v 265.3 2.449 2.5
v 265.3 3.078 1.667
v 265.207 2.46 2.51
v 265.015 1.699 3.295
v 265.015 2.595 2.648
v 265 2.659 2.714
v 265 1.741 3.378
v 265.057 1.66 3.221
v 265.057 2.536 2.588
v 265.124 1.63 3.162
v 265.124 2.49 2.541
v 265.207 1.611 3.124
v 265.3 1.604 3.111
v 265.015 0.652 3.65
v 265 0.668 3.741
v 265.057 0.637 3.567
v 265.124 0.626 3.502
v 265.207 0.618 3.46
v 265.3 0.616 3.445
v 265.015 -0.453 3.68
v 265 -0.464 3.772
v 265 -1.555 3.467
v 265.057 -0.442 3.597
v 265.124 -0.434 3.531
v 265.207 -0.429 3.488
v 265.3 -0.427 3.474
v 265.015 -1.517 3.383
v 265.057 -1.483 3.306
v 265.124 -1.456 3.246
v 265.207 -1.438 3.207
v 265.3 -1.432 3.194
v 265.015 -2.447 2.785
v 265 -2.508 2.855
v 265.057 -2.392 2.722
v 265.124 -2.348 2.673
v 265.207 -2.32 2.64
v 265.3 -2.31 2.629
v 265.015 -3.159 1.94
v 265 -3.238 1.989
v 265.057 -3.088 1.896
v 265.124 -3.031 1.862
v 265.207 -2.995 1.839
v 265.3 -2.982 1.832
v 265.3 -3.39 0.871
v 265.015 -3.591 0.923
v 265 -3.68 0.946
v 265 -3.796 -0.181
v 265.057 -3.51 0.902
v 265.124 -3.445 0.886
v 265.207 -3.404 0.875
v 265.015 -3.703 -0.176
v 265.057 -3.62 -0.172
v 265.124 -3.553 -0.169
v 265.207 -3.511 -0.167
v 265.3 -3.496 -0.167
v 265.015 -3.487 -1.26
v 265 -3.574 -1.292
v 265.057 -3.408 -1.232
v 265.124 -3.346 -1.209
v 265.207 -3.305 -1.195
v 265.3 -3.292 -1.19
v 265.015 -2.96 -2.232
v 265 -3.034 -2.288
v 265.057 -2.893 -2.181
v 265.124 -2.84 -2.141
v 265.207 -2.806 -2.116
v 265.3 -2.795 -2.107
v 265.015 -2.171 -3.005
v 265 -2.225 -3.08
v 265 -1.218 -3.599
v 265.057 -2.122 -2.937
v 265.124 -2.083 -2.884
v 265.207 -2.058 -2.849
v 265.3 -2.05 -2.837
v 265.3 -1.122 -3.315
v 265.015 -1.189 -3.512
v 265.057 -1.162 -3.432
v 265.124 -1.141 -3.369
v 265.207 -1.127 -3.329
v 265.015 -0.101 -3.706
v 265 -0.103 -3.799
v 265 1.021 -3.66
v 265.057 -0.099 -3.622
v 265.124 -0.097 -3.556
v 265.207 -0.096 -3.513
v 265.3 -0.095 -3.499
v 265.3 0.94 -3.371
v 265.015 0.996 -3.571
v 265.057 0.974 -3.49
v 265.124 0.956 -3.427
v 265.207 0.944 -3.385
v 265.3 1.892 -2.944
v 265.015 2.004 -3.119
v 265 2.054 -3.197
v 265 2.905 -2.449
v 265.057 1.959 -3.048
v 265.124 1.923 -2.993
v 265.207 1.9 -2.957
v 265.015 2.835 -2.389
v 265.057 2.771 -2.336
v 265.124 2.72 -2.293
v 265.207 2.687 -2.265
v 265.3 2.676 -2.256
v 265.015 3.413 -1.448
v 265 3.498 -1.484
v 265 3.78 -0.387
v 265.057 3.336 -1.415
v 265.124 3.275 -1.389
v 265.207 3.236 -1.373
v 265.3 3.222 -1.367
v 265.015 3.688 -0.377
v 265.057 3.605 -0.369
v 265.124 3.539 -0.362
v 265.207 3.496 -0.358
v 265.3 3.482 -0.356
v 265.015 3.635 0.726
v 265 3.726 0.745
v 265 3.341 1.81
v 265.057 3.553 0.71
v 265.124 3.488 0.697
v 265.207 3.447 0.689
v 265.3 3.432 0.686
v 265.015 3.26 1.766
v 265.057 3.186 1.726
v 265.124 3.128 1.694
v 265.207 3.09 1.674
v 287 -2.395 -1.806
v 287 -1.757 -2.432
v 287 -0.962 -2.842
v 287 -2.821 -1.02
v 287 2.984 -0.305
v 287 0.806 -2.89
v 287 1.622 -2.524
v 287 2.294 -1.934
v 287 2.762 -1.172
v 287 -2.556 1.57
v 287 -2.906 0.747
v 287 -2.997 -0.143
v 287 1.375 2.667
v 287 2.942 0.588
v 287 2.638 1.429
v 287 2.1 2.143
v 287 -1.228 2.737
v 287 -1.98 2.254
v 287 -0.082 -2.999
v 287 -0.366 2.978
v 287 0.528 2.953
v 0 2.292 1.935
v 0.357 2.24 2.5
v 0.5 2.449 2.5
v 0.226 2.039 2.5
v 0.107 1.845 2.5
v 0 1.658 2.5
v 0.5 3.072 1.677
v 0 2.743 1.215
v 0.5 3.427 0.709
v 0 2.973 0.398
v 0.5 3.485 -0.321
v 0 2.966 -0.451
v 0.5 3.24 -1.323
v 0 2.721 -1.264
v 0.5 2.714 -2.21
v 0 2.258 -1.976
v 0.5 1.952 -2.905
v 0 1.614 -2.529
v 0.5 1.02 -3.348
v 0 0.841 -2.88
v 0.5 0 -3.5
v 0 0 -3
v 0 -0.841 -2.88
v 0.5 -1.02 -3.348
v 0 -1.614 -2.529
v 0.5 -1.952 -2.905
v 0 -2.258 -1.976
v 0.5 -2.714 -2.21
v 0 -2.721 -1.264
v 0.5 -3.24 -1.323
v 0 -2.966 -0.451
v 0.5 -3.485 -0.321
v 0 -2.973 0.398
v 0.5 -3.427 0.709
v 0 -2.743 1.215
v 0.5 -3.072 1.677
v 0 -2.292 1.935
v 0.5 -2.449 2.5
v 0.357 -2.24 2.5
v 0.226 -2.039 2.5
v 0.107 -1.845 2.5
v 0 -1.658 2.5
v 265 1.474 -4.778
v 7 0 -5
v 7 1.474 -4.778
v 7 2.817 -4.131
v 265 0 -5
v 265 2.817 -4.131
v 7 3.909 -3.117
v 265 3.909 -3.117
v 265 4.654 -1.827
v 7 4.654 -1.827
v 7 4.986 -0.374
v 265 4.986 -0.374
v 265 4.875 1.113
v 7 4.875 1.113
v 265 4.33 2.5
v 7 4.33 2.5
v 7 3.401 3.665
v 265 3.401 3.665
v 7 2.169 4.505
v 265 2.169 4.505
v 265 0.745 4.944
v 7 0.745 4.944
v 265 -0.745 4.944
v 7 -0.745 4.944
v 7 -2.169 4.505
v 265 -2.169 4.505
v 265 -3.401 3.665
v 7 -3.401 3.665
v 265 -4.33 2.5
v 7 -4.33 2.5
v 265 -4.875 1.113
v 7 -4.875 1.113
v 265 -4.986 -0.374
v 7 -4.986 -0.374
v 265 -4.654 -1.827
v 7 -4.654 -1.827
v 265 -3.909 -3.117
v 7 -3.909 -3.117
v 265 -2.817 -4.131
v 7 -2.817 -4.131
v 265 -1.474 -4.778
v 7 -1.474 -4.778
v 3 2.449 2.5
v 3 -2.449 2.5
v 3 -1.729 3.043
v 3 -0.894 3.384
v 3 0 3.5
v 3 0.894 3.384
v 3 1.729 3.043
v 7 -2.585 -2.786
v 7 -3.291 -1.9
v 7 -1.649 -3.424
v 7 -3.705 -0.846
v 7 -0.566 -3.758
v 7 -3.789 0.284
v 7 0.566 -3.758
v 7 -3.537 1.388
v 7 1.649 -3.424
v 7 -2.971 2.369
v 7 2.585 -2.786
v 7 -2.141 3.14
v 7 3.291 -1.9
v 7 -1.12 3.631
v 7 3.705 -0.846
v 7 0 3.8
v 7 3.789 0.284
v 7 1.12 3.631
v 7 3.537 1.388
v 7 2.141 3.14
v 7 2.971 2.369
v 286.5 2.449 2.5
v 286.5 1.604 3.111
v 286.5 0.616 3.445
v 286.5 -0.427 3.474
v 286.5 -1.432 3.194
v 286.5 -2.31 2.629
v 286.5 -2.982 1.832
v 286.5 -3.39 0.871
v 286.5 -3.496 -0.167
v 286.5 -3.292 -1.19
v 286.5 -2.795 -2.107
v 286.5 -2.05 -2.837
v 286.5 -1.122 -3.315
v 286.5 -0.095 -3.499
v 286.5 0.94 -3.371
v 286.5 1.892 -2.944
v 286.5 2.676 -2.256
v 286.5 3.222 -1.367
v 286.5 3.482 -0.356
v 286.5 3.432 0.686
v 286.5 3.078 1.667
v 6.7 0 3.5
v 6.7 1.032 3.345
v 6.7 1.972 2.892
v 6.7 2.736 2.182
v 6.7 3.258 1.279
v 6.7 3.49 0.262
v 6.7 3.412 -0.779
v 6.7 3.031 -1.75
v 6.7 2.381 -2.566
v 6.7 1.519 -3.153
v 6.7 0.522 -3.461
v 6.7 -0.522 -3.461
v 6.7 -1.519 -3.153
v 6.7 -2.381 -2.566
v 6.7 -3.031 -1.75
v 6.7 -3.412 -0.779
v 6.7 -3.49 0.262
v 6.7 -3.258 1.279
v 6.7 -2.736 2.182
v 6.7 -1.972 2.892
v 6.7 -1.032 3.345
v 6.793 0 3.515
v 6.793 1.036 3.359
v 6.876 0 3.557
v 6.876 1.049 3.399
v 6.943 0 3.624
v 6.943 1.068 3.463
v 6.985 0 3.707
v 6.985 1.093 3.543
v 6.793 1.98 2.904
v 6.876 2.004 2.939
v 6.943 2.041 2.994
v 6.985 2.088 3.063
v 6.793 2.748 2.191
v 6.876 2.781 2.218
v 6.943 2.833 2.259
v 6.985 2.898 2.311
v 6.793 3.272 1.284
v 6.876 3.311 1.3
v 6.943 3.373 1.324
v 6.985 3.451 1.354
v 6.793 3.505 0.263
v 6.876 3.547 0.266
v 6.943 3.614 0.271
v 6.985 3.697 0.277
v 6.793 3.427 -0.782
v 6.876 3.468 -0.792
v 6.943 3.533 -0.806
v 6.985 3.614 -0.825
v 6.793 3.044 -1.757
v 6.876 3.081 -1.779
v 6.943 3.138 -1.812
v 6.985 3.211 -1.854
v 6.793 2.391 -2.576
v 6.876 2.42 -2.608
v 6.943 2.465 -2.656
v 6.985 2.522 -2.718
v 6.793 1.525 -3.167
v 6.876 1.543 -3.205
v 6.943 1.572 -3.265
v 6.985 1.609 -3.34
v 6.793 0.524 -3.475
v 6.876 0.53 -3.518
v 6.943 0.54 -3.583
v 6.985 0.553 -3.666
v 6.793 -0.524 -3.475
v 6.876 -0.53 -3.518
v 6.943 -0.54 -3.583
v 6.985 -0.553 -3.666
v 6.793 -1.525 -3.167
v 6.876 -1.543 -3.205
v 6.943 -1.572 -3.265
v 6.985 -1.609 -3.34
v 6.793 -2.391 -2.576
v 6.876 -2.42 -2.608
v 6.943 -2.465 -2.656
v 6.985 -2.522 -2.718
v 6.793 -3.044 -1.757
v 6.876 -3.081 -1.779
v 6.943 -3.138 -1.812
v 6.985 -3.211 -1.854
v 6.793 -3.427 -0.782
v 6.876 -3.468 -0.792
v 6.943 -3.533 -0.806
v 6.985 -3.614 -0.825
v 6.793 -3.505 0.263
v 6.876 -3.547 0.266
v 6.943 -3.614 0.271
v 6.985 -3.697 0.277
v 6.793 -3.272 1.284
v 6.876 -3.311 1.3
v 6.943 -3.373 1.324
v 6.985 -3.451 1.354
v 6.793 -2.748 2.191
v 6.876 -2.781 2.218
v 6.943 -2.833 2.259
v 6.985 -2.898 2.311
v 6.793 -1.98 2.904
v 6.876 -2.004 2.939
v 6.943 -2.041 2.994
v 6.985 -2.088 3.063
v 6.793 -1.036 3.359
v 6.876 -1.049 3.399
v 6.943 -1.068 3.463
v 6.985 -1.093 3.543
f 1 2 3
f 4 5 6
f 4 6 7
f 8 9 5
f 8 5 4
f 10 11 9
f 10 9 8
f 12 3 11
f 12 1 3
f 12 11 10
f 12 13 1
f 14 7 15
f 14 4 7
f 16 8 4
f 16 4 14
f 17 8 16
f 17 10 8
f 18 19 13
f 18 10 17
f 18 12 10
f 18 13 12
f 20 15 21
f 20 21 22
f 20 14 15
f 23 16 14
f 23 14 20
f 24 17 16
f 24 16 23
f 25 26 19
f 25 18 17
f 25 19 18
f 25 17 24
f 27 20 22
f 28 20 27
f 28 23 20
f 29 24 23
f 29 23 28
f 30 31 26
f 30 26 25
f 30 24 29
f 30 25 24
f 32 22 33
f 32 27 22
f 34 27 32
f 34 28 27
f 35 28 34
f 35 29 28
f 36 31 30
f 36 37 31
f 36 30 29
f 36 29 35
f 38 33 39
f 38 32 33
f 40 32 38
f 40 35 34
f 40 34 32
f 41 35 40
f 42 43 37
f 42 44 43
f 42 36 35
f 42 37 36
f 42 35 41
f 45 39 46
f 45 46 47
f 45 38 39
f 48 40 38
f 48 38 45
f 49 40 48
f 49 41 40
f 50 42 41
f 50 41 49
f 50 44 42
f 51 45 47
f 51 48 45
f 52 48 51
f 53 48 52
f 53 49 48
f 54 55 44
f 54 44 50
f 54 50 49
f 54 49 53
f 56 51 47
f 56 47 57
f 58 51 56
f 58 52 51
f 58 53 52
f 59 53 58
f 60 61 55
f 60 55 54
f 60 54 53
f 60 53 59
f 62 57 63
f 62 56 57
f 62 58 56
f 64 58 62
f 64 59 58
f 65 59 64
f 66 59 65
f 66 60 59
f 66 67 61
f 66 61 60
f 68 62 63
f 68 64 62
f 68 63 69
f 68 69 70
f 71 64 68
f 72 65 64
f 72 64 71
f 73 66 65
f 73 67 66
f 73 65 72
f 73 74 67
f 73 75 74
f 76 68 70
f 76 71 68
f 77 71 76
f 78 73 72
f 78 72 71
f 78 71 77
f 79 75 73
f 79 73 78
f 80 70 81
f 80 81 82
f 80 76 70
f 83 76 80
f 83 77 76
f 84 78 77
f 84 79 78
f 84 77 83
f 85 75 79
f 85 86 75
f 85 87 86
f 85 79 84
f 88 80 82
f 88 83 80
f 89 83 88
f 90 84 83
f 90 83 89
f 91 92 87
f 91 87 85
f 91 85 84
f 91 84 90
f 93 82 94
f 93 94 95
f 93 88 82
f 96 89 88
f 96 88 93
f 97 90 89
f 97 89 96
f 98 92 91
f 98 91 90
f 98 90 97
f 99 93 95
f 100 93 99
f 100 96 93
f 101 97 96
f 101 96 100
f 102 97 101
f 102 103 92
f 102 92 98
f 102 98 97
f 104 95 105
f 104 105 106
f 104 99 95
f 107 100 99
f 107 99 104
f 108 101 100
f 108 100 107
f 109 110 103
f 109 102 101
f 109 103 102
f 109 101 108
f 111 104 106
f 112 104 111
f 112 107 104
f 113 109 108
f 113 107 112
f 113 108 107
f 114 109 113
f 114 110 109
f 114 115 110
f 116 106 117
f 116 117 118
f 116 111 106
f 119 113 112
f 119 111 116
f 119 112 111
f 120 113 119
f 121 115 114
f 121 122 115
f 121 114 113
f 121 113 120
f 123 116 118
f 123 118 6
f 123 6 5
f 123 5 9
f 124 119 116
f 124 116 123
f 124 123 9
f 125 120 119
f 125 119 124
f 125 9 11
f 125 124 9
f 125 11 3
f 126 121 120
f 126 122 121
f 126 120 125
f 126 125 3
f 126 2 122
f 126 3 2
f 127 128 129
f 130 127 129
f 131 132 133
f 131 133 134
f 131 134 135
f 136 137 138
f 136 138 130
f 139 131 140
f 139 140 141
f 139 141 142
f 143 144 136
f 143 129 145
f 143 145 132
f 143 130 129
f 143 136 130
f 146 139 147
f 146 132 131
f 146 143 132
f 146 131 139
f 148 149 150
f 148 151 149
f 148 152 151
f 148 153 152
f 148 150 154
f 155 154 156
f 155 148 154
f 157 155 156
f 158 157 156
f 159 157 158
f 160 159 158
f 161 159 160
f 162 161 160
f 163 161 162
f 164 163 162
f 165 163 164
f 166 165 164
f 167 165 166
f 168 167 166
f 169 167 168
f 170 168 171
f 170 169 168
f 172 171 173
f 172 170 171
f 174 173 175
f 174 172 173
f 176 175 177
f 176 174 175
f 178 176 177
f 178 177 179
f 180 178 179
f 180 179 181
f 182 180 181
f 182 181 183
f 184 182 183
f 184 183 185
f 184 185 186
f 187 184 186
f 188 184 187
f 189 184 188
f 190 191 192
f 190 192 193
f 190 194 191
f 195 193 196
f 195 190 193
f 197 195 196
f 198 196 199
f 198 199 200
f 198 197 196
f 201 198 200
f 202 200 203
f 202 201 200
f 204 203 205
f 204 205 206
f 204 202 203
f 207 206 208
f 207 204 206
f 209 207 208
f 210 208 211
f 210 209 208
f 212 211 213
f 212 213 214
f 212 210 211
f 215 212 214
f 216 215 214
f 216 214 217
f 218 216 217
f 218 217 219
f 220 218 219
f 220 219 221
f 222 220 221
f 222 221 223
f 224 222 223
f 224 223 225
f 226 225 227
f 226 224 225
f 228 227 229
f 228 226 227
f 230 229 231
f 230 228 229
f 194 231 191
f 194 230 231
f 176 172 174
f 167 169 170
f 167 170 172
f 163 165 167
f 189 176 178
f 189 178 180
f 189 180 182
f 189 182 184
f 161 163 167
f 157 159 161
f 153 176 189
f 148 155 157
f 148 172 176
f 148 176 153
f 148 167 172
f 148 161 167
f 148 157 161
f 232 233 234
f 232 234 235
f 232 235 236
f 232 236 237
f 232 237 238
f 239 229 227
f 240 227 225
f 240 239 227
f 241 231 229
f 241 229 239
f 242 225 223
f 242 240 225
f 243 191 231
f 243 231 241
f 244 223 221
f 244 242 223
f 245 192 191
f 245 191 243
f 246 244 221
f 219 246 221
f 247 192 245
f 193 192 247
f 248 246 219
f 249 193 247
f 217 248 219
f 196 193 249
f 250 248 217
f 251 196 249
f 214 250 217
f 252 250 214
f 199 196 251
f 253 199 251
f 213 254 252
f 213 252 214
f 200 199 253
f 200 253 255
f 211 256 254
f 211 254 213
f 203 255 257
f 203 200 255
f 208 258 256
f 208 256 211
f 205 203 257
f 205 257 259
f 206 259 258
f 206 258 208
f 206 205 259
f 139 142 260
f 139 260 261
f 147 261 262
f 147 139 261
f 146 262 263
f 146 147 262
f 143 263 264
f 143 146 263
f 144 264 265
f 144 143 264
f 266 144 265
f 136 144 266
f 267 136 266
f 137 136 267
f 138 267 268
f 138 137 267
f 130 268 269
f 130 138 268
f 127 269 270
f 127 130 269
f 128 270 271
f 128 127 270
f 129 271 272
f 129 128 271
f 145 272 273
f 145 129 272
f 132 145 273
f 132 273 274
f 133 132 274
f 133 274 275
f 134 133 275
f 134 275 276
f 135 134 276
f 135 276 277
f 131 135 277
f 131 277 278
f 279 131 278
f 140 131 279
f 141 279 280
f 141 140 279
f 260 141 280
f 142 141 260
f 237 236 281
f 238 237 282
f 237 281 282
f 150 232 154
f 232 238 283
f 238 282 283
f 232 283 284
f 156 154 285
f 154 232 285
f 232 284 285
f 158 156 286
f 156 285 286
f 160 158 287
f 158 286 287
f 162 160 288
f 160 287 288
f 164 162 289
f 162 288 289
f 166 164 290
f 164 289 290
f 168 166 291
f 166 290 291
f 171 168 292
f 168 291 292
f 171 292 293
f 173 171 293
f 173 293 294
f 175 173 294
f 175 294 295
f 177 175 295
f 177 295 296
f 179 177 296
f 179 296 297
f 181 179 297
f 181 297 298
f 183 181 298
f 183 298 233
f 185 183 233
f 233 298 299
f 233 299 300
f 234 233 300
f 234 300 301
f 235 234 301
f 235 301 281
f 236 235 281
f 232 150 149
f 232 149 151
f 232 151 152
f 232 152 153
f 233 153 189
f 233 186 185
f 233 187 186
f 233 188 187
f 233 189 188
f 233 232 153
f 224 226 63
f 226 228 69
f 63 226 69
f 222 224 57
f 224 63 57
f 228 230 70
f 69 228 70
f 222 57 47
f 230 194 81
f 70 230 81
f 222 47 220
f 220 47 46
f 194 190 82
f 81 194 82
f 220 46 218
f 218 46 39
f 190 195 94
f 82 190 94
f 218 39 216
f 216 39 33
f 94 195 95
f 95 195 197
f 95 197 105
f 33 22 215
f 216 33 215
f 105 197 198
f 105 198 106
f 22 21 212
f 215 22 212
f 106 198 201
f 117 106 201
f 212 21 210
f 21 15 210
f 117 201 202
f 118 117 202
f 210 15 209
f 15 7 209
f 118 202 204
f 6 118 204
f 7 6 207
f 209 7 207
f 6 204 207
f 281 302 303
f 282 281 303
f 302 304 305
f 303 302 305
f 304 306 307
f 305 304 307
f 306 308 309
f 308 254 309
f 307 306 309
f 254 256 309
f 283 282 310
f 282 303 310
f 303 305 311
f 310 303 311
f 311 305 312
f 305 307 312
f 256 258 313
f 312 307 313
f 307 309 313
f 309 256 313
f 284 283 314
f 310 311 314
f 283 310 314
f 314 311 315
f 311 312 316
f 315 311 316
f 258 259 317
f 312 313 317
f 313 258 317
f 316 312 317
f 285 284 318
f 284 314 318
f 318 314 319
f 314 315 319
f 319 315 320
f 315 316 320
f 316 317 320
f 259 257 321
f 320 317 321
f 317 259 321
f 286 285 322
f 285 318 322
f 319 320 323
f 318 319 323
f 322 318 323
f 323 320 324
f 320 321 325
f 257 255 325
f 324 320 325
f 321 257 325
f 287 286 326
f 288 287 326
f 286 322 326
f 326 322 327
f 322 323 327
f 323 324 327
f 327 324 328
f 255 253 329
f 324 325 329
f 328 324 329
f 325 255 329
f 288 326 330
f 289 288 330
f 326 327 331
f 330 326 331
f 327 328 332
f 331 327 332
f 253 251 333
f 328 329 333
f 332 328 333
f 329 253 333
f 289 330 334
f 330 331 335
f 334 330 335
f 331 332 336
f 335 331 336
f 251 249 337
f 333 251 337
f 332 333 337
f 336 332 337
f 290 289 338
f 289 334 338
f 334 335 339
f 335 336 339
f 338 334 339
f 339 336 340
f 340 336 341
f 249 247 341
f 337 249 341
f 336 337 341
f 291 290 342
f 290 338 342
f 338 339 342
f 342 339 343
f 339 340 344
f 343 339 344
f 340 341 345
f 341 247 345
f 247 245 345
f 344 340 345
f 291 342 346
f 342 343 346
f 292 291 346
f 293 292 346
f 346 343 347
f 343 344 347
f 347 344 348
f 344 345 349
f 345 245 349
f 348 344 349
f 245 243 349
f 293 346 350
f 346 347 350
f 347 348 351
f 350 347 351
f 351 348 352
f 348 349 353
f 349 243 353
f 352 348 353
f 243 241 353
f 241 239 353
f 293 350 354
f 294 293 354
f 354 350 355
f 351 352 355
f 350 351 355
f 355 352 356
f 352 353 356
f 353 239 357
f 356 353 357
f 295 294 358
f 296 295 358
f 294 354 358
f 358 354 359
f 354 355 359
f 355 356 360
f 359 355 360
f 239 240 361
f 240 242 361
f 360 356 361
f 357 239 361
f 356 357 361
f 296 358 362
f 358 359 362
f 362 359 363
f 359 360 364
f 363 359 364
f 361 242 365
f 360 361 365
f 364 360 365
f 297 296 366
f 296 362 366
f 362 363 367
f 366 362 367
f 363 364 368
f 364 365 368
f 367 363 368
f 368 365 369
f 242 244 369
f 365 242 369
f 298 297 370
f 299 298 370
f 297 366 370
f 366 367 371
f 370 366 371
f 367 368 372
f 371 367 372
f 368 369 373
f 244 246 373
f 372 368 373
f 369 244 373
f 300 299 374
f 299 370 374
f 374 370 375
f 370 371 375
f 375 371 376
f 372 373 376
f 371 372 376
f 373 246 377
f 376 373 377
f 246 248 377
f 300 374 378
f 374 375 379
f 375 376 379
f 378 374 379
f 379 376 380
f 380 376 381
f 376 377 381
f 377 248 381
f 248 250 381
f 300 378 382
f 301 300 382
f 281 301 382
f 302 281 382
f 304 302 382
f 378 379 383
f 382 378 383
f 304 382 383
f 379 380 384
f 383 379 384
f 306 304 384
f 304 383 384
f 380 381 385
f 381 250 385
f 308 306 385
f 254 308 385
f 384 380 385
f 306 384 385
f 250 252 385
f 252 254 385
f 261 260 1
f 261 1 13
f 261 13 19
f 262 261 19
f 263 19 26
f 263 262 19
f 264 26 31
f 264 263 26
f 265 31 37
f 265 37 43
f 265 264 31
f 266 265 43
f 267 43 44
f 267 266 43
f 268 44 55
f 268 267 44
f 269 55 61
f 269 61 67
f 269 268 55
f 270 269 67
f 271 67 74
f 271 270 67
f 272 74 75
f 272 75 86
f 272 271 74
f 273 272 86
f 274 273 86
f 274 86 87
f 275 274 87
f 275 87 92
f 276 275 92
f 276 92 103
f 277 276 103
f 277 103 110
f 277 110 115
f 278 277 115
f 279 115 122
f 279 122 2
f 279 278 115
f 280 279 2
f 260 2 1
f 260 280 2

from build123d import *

# Parameters (mm, degrees)
SKETCH1_W           = 258
SKETCH1_H           = 5
SKETCH2_R           = 3.5
BOSS_EXTRUDE1_DEPTH = 7
CUT_EXTRUDE1_START  = -3
CUT_EXTRUDE1_DEPTH  = 3
BOSS_EXTRUDE2_START = 22
SKETCH4_R           = 3.5
BOSS_EXTRUDE2_DEPTH = 22
CHAMFER1_SIZE       = 0.5
FILLET1_R           = 0.3


with BuildPart() as part:
    # Sketch1 → Revolve1 (revolve)
    with BuildSketch(Plane.XY, mode=Mode.PRIVATE) as revolve1_sk:
        with Locations((136, 2.5)):
            Rectangle(SKETCH1_W, SKETCH1_H)
    revolve(revolve1_sk.sketch.rotate(Axis((7, 0, 0), (1, 0, 0)), 270), axis=Axis((7, 0, 0), (1, 0, 0)))

    # Sketch2 → Boss-Extrude1 (add)
    with BuildSketch(Plane.ZY.offset(-7)):
        Circle(SKETCH2_R)
    extrude(amount=BOSS_EXTRUDE1_DEPTH)

    # Sketch3 → Cut-Extrude1 (cut)
    with BuildSketch(Plane.ZY.offset(CUT_EXTRUDE1_START)):
        with BuildLine():
            Line((2.5, 2.449489743), (2.5, -2.449489743))
            ThreePointArc((2.5, -2.449489743), (3.5, 0), (2.5, 2.449489743))
        make_face()
    extrude(amount=CUT_EXTRUDE1_DEPTH, mode=Mode.SUBTRACT)

    # Sketch4 → Boss-Extrude2 (add)
    with BuildSketch(Plane(origin=(265, 0, 0), x_dir=(0, 0, -1), z_dir=(1, 0, 0)).offset(BOSS_EXTRUDE2_START)):
        with Locations(Location((0, 0, 0), (0, 0, 135.584691403))):
            Circle(SKETCH4_R)
    extrude(amount=-BOSS_EXTRUDE2_DEPTH)

    # Chamfer1
    chamfer1_edges = [part.edges().sort_by_distance(p)[0] for p in [
        (287, -2.449489743, -2.5),
        (0, 0, -3.5),
    ]]
    chamfer(chamfer1_edges, length=CHAMFER1_SIZE)

    # Fillet1
    fillet1_edges = [part.edges().sort_by_distance(p)[0] for p in [
        (265, -2.449489743, -2.5),
        (7, 0, -3.5),
    ]]
    fillet(fillet1_edges, radius=FILLET1_R)


solid = part.part
